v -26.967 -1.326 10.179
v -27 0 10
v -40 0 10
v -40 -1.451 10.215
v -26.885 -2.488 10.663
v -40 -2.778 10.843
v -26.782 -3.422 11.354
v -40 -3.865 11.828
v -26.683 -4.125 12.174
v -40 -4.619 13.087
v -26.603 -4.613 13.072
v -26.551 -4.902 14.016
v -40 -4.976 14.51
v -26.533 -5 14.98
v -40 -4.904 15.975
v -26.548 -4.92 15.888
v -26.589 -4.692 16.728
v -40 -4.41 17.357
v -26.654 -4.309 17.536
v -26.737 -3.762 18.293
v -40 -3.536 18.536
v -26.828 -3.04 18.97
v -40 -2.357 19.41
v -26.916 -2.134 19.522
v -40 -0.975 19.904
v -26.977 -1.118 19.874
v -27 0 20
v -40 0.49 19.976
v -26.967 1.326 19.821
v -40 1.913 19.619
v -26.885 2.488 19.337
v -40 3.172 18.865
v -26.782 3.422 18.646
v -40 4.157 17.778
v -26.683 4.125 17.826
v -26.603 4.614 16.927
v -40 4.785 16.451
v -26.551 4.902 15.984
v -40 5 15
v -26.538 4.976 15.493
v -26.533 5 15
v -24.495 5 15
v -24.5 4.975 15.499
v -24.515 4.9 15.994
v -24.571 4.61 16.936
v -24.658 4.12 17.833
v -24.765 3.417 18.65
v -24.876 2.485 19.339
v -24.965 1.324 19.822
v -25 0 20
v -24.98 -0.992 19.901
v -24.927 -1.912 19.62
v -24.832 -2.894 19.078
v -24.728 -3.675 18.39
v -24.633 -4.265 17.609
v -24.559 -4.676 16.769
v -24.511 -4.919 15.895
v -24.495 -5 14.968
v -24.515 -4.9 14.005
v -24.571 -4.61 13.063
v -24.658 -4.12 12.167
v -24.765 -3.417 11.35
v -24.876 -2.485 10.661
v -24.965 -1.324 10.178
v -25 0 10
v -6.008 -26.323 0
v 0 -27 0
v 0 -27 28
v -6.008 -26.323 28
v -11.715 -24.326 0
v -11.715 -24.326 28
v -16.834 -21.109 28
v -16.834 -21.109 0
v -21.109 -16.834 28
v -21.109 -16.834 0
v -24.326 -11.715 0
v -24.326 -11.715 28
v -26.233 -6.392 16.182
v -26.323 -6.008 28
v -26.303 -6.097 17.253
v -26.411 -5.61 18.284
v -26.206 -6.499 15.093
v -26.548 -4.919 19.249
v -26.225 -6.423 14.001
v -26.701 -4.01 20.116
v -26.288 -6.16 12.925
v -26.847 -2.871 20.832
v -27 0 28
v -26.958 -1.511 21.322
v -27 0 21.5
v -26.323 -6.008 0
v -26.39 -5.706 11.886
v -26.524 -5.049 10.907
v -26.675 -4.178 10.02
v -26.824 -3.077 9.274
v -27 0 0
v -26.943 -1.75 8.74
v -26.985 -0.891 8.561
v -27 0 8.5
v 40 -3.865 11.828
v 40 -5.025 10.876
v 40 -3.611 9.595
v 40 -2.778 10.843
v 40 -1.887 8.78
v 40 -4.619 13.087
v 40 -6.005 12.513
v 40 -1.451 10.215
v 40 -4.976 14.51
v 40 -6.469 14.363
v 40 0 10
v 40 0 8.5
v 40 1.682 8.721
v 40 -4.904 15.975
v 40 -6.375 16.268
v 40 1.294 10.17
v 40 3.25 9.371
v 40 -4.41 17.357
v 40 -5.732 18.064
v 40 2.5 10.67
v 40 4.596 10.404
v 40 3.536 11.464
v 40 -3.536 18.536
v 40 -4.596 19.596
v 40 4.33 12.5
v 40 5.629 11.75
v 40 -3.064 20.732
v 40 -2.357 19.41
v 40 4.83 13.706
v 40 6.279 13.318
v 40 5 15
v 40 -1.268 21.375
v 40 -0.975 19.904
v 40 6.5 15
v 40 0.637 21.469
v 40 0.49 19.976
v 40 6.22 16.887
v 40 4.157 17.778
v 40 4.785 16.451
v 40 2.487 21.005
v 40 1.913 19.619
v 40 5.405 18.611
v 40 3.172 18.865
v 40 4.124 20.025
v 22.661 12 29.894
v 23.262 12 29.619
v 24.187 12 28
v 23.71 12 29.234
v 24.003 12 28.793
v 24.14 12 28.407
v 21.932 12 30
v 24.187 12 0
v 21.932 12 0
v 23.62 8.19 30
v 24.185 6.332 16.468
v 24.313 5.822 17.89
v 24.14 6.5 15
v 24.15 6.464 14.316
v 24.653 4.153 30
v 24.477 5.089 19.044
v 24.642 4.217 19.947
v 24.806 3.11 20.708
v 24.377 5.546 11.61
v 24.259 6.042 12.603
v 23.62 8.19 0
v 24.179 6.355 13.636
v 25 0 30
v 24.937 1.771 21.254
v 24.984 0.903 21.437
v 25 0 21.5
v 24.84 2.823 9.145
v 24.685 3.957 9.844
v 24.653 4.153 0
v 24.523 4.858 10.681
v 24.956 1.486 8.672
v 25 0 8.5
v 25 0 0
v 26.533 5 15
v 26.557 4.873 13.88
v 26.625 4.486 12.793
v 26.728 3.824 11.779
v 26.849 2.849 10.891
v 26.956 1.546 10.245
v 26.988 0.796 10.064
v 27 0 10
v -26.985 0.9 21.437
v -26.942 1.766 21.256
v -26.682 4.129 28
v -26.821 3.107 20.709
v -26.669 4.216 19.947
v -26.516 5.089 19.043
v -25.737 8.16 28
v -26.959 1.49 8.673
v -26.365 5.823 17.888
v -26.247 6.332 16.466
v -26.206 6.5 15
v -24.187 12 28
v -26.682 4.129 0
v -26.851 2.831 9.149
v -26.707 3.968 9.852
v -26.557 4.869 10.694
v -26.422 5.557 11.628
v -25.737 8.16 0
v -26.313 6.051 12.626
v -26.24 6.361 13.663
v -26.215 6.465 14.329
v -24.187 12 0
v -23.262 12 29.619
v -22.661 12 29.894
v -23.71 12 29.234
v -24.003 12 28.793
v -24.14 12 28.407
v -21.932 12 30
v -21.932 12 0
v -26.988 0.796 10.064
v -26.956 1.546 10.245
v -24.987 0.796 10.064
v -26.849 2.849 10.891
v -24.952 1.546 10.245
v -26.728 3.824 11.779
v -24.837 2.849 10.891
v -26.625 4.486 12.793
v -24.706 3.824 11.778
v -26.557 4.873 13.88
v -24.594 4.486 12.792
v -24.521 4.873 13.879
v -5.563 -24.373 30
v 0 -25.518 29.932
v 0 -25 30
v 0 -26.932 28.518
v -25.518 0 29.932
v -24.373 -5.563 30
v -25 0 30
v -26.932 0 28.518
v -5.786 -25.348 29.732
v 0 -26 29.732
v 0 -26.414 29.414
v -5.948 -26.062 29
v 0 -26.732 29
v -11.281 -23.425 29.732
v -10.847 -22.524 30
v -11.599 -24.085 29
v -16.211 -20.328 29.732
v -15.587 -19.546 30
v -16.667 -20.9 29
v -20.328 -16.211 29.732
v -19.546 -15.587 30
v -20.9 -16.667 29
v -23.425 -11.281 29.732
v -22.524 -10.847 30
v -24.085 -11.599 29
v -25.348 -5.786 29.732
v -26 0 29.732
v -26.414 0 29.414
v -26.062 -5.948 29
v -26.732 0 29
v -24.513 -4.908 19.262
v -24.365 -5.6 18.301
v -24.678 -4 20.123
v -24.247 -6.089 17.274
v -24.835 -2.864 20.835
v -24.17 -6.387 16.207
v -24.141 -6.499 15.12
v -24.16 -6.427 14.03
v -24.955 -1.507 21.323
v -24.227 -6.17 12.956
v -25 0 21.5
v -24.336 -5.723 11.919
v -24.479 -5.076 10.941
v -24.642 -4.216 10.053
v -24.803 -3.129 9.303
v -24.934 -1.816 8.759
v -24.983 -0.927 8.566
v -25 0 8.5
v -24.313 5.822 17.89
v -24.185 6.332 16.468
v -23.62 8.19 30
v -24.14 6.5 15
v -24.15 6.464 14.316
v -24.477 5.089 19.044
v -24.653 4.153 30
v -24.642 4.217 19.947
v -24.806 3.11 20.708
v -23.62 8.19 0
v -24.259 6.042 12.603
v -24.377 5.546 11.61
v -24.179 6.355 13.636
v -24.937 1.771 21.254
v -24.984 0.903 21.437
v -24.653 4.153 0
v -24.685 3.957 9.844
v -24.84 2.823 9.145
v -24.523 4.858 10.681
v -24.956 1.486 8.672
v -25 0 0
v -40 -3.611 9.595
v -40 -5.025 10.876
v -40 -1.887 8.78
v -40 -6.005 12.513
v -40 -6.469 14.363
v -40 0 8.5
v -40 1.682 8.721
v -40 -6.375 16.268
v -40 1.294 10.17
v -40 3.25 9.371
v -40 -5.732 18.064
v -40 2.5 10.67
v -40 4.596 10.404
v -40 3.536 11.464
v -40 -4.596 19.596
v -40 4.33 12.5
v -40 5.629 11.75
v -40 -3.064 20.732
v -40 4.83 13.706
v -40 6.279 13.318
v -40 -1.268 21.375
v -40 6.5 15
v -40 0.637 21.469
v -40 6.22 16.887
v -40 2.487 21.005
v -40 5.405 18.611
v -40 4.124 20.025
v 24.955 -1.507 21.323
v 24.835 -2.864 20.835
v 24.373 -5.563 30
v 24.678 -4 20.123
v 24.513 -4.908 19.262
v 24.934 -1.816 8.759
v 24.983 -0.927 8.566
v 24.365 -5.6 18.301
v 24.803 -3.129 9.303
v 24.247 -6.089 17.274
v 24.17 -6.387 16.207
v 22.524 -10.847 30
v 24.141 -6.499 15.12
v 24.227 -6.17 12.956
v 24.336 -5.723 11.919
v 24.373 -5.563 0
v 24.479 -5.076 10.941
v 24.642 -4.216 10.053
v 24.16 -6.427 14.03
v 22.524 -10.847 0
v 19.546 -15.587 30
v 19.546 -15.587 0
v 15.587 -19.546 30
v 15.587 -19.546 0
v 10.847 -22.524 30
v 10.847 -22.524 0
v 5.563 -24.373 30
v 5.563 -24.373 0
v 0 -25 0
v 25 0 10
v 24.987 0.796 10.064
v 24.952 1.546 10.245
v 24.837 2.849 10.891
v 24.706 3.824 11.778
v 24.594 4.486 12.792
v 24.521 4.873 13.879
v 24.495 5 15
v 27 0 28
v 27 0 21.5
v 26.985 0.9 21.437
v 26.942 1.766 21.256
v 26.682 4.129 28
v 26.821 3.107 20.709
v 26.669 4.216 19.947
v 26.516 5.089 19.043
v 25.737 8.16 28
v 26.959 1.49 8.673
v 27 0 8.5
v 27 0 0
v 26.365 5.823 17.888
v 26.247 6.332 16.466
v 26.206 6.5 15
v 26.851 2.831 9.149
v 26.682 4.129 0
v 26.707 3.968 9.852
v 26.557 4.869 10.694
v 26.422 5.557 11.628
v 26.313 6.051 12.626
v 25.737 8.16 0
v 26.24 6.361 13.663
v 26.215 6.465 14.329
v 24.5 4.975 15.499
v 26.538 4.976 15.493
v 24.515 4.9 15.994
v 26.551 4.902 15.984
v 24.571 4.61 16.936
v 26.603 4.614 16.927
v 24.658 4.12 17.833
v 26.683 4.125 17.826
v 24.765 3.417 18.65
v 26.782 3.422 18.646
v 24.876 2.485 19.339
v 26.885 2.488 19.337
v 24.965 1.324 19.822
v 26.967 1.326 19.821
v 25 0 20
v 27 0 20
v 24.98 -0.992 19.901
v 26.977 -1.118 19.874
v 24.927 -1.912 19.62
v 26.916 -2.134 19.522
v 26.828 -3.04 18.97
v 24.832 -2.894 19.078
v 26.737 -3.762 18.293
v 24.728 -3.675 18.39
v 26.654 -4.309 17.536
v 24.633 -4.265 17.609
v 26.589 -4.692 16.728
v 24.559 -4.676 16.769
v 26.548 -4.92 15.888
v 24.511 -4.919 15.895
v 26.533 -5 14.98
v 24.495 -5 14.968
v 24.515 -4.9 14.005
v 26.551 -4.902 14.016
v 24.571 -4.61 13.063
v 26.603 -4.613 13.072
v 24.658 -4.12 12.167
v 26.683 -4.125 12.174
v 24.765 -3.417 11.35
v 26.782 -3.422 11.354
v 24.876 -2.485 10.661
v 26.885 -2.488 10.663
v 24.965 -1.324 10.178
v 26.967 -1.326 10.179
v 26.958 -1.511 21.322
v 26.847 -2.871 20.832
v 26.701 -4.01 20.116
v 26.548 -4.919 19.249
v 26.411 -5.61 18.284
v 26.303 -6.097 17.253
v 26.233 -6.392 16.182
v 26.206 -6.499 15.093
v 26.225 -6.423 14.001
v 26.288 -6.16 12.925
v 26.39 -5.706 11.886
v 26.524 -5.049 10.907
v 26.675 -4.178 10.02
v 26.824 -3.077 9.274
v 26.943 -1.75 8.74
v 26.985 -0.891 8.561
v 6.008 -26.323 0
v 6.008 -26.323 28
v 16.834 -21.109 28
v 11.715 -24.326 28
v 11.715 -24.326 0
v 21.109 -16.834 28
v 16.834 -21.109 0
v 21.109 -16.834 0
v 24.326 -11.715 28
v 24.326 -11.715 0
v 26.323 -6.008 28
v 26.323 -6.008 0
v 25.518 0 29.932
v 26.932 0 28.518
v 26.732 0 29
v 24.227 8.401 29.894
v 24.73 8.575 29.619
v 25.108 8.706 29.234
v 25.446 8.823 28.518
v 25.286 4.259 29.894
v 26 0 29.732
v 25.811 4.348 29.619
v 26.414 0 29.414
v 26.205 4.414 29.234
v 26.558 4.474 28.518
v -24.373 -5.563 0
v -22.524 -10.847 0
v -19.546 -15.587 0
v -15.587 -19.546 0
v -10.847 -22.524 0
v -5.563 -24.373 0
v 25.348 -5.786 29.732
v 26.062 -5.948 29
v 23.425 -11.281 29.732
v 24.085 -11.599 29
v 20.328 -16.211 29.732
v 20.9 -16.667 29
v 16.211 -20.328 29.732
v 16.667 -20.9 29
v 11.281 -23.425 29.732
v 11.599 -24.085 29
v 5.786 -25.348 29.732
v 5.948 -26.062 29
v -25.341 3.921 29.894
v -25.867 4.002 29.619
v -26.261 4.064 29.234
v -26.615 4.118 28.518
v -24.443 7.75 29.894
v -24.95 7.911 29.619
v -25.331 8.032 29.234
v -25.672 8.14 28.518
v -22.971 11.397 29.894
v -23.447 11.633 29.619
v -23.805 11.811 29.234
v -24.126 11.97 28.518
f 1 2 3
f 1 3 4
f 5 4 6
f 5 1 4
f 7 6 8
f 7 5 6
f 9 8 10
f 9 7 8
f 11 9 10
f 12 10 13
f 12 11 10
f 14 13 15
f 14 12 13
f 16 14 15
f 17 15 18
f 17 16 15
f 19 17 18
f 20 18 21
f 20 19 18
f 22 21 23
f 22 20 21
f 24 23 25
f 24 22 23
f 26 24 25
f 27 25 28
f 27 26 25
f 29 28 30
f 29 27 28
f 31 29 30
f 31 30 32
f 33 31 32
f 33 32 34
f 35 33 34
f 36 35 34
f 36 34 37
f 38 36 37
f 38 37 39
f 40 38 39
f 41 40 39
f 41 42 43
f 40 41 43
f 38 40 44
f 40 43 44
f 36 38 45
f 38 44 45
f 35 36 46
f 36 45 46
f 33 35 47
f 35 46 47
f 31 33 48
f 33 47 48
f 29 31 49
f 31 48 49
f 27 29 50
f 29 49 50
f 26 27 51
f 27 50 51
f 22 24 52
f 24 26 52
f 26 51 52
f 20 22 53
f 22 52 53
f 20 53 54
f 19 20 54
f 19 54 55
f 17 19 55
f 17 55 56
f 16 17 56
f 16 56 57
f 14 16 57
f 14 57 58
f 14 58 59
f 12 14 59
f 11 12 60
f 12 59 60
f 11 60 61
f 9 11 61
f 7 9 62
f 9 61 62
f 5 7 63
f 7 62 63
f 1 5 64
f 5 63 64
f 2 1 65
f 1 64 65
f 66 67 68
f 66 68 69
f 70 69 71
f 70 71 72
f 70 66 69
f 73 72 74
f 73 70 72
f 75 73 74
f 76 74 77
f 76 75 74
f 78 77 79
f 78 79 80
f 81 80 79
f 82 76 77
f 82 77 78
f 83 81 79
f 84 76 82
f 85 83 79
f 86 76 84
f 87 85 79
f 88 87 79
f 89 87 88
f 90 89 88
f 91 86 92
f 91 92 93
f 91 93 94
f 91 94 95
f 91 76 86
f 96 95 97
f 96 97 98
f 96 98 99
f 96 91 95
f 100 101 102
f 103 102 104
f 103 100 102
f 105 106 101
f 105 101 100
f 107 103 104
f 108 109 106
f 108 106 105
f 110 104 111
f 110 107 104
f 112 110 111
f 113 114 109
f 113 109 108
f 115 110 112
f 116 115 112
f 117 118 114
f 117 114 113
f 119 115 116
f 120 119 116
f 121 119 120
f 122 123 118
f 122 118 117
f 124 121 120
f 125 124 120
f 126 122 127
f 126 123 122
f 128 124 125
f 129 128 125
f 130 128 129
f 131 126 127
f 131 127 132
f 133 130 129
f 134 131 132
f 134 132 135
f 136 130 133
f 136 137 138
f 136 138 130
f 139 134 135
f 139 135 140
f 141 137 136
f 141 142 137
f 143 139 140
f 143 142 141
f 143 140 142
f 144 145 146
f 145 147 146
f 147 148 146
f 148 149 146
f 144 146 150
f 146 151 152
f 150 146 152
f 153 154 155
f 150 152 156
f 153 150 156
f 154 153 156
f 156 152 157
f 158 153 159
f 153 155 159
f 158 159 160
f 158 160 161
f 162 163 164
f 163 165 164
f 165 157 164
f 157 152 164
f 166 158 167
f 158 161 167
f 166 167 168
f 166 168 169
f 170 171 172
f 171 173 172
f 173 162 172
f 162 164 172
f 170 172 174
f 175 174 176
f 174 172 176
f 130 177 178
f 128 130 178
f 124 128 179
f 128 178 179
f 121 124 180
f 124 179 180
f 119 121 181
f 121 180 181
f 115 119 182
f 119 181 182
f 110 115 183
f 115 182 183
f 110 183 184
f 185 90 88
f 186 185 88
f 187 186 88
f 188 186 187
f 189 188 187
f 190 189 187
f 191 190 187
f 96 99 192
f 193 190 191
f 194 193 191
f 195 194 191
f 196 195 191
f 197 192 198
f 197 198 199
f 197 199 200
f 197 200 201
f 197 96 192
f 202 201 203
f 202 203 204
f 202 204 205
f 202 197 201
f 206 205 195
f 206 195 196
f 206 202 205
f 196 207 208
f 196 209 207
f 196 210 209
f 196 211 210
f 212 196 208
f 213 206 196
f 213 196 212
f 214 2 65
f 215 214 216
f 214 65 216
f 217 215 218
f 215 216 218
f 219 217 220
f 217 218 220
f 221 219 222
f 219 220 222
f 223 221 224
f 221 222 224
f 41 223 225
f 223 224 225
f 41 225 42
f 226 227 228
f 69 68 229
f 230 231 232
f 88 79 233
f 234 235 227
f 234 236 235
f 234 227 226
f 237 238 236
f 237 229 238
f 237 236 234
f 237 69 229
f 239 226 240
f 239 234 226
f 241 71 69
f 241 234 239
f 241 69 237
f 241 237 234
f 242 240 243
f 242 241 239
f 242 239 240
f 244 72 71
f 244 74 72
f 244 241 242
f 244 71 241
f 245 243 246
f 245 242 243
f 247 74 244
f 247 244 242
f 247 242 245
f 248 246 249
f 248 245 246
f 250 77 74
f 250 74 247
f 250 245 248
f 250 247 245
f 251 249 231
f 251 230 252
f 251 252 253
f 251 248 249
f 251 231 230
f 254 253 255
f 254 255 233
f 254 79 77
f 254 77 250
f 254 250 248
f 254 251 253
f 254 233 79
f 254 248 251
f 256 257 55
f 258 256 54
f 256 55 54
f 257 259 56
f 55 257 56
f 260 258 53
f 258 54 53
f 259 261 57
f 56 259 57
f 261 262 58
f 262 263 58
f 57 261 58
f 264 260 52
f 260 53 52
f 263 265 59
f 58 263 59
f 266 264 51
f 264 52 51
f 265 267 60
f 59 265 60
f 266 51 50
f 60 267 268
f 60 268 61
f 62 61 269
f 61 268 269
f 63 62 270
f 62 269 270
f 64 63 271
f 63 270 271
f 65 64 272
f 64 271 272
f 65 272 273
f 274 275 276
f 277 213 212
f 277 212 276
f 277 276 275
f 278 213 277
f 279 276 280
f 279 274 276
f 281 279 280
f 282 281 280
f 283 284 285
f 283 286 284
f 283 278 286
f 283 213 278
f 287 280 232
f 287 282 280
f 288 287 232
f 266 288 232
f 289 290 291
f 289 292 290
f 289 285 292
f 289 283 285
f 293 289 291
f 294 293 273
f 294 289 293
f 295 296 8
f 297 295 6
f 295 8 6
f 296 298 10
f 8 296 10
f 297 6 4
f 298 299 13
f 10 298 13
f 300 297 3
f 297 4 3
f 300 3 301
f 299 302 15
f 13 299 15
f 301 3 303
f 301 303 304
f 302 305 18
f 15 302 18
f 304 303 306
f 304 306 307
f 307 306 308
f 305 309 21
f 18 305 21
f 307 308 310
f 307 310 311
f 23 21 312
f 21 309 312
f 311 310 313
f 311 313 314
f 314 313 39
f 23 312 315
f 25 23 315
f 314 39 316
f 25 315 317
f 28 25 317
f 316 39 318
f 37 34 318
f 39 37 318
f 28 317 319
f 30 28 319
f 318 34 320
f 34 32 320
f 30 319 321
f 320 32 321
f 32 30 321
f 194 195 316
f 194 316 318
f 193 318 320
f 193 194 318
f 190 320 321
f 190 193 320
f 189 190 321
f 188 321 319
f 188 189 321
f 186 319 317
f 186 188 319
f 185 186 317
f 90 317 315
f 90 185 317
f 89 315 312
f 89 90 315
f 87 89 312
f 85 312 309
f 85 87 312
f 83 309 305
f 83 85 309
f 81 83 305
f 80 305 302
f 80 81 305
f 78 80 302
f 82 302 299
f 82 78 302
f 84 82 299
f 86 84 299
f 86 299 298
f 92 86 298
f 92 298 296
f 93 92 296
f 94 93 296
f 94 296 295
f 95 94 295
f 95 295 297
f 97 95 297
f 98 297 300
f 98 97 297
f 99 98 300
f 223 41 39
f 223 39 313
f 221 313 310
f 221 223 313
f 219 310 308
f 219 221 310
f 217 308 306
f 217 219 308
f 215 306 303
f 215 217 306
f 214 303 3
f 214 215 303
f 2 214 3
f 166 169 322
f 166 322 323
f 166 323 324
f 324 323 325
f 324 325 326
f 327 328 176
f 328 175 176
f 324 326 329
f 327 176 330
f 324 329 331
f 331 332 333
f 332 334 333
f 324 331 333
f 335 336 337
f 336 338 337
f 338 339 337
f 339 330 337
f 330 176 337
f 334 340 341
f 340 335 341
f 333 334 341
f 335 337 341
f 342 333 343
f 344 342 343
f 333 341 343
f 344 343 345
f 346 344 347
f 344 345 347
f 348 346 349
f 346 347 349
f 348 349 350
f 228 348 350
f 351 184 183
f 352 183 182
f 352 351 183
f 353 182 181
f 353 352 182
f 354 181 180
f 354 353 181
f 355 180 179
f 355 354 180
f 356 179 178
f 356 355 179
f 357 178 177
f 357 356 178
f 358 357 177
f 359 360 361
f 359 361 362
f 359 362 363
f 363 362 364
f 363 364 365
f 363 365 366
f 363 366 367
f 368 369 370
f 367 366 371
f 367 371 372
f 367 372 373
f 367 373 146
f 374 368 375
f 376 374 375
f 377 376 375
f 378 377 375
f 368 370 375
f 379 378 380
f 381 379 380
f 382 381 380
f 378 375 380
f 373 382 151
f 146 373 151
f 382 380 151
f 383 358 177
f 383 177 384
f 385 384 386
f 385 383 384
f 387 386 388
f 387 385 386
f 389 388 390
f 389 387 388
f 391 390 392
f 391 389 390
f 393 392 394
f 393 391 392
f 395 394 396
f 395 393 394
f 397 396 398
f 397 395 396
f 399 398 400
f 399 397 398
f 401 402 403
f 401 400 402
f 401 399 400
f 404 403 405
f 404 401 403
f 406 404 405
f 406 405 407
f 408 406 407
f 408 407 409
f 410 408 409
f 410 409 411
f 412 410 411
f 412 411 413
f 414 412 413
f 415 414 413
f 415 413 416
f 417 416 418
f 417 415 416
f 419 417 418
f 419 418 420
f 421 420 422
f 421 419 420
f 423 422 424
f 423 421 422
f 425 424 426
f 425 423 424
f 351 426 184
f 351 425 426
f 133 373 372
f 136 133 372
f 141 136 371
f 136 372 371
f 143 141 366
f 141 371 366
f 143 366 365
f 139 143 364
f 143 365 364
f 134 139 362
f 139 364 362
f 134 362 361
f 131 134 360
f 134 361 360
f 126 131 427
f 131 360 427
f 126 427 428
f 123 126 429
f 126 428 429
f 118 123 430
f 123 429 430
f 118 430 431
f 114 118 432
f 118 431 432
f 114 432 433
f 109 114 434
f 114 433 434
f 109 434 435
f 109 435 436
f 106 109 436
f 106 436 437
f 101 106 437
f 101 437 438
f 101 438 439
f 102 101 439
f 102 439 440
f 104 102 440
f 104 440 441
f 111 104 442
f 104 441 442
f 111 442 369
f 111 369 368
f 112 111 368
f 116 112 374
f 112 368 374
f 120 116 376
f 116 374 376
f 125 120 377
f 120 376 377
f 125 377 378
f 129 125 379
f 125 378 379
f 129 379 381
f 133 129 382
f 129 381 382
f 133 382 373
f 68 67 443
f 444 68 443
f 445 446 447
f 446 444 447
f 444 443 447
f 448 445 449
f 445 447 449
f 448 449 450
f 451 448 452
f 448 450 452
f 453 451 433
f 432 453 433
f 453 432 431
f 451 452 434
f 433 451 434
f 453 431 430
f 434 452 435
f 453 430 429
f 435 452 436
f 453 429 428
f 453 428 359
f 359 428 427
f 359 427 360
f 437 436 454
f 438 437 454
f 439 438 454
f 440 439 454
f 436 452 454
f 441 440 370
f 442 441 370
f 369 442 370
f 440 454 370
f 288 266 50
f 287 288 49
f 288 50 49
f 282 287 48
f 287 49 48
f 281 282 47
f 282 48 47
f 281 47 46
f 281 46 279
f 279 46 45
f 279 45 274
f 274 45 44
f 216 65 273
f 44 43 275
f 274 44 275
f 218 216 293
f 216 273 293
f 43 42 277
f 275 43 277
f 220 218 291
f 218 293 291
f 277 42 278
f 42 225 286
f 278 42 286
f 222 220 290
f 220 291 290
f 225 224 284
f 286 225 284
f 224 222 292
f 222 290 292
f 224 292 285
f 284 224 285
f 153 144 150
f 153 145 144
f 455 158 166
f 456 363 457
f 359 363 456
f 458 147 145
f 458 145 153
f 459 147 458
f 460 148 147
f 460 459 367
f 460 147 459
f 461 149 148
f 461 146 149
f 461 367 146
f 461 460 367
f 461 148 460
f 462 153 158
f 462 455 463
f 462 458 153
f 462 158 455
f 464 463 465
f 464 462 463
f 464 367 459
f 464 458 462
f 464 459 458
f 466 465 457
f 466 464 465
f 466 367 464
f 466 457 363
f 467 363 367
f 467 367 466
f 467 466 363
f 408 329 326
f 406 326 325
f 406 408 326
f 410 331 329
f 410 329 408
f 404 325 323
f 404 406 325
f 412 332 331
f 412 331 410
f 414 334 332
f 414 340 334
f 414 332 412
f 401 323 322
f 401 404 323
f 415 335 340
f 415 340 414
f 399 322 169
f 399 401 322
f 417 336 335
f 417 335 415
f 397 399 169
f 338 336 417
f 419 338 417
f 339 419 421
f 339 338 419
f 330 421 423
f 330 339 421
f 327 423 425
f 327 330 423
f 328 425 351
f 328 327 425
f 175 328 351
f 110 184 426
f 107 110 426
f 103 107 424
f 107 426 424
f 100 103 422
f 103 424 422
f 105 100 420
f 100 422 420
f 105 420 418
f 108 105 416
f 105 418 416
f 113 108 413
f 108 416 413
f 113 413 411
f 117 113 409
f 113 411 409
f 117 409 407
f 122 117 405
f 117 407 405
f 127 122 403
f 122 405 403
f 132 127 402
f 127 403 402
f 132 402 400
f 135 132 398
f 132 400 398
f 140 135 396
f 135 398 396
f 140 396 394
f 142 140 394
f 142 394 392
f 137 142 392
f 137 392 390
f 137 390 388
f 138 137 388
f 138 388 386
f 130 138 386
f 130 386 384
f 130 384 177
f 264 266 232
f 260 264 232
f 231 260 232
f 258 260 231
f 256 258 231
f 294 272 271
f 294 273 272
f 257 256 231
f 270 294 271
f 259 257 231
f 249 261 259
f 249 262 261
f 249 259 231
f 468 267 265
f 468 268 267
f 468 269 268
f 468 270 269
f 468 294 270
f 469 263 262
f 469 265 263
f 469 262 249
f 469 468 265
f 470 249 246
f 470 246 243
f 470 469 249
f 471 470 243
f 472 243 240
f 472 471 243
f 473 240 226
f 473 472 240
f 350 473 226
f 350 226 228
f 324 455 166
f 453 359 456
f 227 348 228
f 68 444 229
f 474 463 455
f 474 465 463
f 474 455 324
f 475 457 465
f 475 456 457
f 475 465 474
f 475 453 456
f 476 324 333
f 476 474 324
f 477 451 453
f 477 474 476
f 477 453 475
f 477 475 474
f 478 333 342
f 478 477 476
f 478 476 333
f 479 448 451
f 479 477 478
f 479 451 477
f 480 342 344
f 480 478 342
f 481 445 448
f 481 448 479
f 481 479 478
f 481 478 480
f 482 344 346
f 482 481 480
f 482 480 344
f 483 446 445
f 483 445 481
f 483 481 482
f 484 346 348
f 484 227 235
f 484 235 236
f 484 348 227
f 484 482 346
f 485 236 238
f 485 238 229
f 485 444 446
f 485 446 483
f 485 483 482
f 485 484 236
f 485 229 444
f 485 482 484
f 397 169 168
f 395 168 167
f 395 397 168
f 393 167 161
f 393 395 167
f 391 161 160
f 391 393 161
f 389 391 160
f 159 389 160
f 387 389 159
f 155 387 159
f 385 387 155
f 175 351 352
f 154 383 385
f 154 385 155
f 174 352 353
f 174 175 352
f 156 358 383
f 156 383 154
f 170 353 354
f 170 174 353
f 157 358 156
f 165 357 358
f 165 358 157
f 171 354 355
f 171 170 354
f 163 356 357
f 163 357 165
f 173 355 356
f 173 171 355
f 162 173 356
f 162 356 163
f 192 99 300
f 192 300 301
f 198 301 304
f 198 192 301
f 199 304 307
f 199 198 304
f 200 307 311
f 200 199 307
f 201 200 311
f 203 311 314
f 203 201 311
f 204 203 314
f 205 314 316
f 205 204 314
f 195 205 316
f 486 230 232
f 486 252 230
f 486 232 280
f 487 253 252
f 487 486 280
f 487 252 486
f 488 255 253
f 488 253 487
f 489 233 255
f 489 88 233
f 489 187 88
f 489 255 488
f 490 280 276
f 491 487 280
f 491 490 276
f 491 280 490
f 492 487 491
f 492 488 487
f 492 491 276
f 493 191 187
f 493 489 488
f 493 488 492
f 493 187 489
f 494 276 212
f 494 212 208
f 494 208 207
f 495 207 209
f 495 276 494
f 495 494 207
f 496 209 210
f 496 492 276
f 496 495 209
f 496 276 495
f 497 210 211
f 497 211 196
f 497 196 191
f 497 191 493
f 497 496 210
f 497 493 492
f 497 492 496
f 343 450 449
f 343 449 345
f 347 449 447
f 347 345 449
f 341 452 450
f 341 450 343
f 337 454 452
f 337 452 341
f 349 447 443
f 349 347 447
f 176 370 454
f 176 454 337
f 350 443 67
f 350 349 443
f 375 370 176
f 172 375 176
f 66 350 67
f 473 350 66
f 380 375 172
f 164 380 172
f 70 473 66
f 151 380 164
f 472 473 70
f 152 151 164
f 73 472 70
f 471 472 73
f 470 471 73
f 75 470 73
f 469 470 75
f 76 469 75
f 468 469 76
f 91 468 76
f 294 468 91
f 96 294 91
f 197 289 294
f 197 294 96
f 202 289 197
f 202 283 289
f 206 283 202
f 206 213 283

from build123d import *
from build123d import SkipClean  # not in build123d's __all__

# Parameters (mm, degrees)
F1_DEPTH = 30
F3_DEPTH = 40
F4_DEPTH = 25
F5_DEPTH = 30
F7_R     = 1.99999


# Not quite as in the source:
# - a fillet or chamfer is up to 0.001 mm smaller than in the source, because OpenCascade refuses the exact size


with BuildPart() as f1:
    # F0 (on Top) → F1 (new body)
    with BuildSketch(Plane.XY):
        with BuildLine():
            ThreePointArc((25, 0), (17.6776695297, -17.6776695297), (0, -25))
            Line((0, -25), (0, -27))
            ThreePointArc((0, -27), (19.091883092, -19.091883092), (27, 0))
            ThreePointArc((27, 0), (26.2872866383, 6.1626748408), (24.1867732449, 12))
            Line((24.1867732449, 12), (21.9317121995, 12))
            ThreePointArc((21.9317121995, 12), (24.2207845144, 6.1930281371), (25, 0))
        make_face()
    extrude(amount=F1_DEPTH)

    # F2 (on Right) → F3 (join)
    with BuildSketch(Plane.YZ):
        with BuildLine():
            ThreePointArc((6.5, 15), (-4.5961940777, 19.5961940777), (0, 8.5))
            ThreePointArc((0, 8.5), (4.5961940777, 10.4038059223), (6.5, 15))
        make_face()
        with BuildLine():
            ThreePointArc((5, 15), (3.5355339059, 11.4644660941), (0, 10))
            ThreePointArc((0, 10), (-3.5355339059, 18.5355339059), (5, 15))
        make_face(mode=Mode.SUBTRACT)
    extrude(amount=F3_DEPTH)

    # F0 (on Top) → F4 (cut)
    with BuildSketch(Plane.XY):
        with BuildLine():
            Line((0, 0), (0, -25))
            ThreePointArc((0, -25), (17.6776695297, -17.6776695297), (25, 0))
            ThreePointArc((25, 0), (24.2207845144, 6.1930281371), (21.9317121995, 12))
            Line((21.9317121995, 12), (0, 12))
            Line((0, 12), (0, 0))
        make_face()
    extrude(amount=F4_DEPTH, mode=Mode.SUBTRACT)

    # F2 (on Right) → F5 (cut)
    with BuildSketch(Plane.YZ):
        with BuildLine():
            ThreePointArc((5, 15), (-3.5355339059, 18.5355339059), (0, 10))
            ThreePointArc((0, 10), (3.5355339059, 11.4644660941), (5, 15))
        make_face()
    extrude(amount=F5_DEPTH, mode=Mode.SUBTRACT)

    # F6: F1 across plane


with BuildPart() as f1_1:
    add(f1.part, clean=False)
    with SkipClean():  # cleaning this boolean's faces spoils the solid; the shape is the same uncleaned
        add(f1.part.mirror(Plane.YZ), clean=False)

    # F7 (radius 2 in the source; OpenCascade refuses exactly that, so slightly less here)
    f7_edges = [f1_1.edges().sort_by_distance(p)[0] for p in [
        (-22.945588, -14.230249, 30),
        (22.945588, -14.230249, 30),
    ]]
    fillet(f7_edges, radius=F7_R)


solid = f1_1.part
